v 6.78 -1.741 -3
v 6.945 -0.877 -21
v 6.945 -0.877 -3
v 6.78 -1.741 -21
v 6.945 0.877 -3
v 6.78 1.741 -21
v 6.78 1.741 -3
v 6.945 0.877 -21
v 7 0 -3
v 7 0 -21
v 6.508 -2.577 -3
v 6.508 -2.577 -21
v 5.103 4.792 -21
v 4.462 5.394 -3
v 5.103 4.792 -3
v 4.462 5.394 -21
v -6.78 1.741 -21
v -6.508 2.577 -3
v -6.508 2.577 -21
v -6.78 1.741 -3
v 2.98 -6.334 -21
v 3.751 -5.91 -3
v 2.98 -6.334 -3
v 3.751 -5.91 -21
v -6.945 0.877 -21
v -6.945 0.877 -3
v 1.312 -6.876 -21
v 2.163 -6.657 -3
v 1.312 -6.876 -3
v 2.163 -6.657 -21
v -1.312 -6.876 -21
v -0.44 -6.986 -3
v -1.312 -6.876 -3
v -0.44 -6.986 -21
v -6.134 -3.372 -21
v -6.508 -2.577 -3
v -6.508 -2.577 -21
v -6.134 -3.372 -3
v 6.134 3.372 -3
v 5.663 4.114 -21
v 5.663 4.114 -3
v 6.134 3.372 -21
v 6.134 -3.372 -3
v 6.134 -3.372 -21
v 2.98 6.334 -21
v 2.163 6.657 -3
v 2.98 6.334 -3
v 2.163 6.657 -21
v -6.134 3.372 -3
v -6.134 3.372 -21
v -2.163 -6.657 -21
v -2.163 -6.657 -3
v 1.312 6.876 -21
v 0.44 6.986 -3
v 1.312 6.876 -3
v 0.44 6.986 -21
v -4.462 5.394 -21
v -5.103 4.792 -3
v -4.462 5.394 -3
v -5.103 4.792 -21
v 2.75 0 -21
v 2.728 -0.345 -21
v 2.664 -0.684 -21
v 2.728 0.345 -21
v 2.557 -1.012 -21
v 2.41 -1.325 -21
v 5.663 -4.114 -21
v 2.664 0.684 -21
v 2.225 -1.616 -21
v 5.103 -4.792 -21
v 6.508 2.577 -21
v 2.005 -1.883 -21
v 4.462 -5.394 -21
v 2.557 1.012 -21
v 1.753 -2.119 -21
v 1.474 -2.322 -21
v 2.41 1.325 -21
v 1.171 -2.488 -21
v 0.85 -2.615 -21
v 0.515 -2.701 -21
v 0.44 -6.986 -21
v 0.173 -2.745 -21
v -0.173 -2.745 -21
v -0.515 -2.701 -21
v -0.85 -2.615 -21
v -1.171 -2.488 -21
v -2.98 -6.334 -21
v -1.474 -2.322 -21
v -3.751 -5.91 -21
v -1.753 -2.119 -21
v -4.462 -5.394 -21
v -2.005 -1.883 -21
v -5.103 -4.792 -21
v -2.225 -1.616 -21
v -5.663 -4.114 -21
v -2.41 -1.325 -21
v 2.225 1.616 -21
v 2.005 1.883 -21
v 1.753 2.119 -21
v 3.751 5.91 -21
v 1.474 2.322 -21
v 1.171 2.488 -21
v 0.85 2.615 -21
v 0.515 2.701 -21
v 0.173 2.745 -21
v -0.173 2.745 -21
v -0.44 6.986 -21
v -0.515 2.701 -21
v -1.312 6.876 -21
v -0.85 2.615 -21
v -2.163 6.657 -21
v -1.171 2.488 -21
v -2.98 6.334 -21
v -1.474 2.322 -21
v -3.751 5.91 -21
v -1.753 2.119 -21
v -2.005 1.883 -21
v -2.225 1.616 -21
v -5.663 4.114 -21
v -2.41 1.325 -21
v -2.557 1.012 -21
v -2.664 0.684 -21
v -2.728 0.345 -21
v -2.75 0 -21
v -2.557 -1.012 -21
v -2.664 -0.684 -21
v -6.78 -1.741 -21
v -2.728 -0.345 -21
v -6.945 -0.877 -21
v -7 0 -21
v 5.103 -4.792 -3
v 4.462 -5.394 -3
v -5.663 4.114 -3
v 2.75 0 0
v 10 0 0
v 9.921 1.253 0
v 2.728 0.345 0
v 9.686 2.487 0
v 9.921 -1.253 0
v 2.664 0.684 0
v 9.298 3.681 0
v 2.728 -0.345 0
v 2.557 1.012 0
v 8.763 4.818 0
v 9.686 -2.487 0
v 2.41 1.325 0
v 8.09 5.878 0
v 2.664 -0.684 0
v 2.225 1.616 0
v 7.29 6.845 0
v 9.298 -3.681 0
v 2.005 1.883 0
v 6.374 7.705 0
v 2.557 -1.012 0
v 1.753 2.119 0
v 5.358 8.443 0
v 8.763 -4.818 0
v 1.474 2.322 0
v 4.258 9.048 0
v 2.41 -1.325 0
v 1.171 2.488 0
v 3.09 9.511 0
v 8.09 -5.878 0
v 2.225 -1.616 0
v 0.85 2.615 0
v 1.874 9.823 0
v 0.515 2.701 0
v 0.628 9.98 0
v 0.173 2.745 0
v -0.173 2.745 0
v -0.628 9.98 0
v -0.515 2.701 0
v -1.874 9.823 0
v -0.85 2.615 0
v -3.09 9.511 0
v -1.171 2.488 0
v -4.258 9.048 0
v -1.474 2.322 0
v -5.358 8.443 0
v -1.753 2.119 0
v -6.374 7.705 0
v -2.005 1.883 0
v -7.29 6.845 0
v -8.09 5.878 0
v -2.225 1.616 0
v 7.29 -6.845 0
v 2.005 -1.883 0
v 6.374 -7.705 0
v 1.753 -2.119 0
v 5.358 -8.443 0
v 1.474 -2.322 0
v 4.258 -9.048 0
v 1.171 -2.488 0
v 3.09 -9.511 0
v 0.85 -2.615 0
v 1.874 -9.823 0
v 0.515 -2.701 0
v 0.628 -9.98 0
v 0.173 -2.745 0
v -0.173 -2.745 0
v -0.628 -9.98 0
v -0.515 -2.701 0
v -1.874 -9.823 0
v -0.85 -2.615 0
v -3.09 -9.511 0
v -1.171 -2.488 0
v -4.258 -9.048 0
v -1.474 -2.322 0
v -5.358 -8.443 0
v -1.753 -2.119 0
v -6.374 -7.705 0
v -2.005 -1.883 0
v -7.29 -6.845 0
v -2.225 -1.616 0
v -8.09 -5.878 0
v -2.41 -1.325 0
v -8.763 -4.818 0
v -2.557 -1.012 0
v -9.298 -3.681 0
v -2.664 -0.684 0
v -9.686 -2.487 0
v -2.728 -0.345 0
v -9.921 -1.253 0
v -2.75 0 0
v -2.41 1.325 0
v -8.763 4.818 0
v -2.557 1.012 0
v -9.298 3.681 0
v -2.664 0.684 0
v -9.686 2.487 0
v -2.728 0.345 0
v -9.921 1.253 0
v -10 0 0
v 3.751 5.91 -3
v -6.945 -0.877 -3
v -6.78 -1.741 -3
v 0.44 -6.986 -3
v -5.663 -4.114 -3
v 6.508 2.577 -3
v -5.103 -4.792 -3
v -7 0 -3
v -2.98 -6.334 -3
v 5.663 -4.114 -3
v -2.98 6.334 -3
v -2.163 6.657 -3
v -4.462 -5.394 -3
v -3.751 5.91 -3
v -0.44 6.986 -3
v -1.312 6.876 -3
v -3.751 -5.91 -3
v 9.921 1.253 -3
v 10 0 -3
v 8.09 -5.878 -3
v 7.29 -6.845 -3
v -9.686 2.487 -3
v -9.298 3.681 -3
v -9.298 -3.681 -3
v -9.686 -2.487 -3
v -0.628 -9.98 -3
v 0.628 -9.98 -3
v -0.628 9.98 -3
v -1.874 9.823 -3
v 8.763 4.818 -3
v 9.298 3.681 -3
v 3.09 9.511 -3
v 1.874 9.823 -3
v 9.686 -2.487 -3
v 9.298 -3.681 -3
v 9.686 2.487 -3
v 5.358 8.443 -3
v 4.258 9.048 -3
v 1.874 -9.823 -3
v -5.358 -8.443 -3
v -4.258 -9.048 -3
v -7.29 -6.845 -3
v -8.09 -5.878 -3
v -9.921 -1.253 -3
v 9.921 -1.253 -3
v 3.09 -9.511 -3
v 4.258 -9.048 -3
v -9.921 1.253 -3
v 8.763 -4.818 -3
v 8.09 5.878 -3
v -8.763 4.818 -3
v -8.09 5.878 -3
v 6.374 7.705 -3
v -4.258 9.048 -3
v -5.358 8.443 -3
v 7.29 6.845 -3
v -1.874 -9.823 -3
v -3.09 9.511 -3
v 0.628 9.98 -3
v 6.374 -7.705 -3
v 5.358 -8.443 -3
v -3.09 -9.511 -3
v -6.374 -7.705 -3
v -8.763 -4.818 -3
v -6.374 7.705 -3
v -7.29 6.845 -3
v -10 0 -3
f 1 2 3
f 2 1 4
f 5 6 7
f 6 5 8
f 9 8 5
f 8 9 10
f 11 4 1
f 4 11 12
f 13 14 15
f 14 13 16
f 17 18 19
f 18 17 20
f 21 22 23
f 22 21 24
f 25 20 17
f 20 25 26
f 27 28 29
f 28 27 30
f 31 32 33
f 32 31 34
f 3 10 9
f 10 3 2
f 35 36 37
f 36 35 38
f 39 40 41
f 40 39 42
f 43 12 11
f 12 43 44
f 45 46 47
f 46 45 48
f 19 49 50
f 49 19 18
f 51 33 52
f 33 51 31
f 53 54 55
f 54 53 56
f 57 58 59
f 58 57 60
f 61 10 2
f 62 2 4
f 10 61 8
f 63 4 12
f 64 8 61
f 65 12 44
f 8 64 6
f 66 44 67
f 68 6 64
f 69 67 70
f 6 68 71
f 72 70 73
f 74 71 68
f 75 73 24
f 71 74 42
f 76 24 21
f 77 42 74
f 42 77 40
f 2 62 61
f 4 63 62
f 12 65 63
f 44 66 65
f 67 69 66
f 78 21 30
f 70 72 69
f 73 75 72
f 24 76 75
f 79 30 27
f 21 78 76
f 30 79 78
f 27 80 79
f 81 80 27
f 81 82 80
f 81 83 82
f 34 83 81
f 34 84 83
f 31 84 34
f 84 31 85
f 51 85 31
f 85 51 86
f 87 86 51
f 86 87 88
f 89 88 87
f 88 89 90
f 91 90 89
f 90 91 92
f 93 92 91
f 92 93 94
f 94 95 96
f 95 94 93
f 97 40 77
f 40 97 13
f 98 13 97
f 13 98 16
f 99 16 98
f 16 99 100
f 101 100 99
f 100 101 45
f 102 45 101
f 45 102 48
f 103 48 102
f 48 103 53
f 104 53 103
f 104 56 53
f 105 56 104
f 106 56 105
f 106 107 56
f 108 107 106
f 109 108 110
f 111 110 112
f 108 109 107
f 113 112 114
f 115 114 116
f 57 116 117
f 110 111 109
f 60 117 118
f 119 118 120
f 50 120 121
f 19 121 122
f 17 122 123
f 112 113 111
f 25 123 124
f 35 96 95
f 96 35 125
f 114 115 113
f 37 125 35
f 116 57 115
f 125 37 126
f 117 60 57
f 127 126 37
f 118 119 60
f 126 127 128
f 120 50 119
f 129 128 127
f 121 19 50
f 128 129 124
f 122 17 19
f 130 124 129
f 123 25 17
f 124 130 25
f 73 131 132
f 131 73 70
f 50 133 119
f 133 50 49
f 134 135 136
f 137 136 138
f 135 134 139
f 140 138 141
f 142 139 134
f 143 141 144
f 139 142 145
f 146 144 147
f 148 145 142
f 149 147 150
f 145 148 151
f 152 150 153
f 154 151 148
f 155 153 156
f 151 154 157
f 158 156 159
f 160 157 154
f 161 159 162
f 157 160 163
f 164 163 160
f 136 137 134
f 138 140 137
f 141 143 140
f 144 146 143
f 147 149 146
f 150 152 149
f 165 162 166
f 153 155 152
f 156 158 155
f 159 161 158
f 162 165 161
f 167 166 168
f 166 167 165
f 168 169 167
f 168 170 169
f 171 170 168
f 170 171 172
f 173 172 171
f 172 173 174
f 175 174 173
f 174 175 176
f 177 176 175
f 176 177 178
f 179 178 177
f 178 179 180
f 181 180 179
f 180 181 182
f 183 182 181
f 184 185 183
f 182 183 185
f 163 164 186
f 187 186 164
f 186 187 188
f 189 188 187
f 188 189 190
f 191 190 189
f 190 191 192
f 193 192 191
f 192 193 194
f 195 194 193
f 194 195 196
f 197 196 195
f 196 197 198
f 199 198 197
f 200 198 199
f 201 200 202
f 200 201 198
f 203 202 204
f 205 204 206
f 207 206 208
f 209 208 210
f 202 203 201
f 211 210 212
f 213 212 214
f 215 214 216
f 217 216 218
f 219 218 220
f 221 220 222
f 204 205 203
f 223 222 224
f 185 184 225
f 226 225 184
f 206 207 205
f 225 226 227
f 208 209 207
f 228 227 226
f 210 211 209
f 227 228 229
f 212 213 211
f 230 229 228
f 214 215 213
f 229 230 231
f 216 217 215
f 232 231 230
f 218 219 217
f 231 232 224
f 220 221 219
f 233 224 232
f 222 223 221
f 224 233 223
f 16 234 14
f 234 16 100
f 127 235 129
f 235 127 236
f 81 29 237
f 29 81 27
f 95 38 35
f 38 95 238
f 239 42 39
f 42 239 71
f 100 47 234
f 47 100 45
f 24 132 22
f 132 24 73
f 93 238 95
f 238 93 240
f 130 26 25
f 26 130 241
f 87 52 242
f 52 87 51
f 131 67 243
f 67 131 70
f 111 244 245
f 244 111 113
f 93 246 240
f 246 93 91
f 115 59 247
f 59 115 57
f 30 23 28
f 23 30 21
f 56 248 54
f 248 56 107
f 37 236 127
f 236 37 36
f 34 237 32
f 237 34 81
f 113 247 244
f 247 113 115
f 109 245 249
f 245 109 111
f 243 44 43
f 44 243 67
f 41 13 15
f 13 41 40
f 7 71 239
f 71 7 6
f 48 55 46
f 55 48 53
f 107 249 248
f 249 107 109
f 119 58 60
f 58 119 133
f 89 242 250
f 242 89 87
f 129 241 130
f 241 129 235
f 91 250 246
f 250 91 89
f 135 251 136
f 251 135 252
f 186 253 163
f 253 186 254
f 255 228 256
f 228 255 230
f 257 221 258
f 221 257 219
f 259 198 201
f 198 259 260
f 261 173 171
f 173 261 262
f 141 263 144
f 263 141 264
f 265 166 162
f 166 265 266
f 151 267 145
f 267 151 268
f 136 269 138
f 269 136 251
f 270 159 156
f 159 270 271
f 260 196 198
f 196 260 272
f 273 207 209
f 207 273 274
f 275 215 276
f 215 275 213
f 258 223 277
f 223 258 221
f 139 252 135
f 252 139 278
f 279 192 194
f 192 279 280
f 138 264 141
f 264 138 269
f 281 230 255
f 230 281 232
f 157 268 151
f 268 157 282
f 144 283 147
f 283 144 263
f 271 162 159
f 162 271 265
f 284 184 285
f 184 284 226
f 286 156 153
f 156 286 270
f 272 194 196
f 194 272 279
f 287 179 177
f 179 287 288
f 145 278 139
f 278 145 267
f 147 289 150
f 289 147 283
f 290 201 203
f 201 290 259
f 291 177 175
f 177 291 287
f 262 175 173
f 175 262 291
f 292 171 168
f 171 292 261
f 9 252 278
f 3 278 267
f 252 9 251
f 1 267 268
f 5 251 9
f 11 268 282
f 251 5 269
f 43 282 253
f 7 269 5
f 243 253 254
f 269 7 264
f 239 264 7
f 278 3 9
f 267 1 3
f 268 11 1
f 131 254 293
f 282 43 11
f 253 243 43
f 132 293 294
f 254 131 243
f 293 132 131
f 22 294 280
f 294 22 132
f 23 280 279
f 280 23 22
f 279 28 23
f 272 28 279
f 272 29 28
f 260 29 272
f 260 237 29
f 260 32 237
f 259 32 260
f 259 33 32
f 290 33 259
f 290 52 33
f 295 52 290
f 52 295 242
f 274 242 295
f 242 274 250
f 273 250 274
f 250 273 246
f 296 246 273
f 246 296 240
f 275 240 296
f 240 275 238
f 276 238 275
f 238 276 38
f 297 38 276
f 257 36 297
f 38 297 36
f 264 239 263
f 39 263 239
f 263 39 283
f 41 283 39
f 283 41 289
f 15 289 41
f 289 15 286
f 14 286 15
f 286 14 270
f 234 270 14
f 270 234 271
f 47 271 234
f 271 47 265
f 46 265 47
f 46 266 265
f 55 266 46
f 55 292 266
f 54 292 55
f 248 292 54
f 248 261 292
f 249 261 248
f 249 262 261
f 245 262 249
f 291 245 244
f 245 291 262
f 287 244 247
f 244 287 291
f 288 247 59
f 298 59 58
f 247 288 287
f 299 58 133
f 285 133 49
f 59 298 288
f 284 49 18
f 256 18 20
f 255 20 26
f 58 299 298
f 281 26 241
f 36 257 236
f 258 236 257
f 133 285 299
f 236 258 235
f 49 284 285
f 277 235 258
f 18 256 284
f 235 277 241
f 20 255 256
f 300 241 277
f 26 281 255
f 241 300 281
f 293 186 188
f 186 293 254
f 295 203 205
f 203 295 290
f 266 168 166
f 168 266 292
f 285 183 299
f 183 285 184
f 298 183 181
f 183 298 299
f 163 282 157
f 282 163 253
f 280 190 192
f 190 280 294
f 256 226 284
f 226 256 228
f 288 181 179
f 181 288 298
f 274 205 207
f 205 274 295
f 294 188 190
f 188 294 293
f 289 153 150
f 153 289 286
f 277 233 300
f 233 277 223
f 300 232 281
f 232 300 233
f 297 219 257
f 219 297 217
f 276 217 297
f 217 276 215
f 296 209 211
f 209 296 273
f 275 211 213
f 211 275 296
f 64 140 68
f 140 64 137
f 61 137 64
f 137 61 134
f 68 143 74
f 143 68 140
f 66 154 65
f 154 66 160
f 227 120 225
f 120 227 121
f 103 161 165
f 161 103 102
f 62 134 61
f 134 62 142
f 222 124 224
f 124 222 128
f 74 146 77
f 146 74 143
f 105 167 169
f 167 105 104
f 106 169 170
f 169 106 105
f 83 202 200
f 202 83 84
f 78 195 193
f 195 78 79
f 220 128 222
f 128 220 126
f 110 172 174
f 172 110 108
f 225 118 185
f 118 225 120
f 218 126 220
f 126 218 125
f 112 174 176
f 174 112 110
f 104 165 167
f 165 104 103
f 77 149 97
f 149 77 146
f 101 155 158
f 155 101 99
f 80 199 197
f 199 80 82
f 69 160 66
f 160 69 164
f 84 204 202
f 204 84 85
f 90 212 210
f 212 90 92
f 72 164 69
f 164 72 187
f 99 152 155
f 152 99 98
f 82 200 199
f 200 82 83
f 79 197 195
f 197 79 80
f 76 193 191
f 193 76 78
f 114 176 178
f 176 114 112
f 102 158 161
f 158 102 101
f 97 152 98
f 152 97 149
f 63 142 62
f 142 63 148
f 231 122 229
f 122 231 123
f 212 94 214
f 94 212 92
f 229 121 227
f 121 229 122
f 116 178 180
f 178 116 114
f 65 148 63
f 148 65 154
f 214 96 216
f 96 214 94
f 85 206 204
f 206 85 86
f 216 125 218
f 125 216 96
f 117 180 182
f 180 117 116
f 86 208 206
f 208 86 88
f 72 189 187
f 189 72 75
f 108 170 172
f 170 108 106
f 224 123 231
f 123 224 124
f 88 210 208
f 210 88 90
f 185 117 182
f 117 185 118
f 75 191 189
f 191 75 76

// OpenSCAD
$fn = 50;


difference() {
	union() {
		translate(v = [0, 0, -21.0000000000]) {
			cylinder(h = 21, r = 7.0000000000);
		}
		translate(v = [0, 0, -3.0000000000]) {
			cylinder(h = 3, r = 10.0000000000);
		}
	}
	union() {
		#translate(v = [0, 0, -21]) {
			cylinder(h = 21, r = 2.7500000000);
		}
	}
}
